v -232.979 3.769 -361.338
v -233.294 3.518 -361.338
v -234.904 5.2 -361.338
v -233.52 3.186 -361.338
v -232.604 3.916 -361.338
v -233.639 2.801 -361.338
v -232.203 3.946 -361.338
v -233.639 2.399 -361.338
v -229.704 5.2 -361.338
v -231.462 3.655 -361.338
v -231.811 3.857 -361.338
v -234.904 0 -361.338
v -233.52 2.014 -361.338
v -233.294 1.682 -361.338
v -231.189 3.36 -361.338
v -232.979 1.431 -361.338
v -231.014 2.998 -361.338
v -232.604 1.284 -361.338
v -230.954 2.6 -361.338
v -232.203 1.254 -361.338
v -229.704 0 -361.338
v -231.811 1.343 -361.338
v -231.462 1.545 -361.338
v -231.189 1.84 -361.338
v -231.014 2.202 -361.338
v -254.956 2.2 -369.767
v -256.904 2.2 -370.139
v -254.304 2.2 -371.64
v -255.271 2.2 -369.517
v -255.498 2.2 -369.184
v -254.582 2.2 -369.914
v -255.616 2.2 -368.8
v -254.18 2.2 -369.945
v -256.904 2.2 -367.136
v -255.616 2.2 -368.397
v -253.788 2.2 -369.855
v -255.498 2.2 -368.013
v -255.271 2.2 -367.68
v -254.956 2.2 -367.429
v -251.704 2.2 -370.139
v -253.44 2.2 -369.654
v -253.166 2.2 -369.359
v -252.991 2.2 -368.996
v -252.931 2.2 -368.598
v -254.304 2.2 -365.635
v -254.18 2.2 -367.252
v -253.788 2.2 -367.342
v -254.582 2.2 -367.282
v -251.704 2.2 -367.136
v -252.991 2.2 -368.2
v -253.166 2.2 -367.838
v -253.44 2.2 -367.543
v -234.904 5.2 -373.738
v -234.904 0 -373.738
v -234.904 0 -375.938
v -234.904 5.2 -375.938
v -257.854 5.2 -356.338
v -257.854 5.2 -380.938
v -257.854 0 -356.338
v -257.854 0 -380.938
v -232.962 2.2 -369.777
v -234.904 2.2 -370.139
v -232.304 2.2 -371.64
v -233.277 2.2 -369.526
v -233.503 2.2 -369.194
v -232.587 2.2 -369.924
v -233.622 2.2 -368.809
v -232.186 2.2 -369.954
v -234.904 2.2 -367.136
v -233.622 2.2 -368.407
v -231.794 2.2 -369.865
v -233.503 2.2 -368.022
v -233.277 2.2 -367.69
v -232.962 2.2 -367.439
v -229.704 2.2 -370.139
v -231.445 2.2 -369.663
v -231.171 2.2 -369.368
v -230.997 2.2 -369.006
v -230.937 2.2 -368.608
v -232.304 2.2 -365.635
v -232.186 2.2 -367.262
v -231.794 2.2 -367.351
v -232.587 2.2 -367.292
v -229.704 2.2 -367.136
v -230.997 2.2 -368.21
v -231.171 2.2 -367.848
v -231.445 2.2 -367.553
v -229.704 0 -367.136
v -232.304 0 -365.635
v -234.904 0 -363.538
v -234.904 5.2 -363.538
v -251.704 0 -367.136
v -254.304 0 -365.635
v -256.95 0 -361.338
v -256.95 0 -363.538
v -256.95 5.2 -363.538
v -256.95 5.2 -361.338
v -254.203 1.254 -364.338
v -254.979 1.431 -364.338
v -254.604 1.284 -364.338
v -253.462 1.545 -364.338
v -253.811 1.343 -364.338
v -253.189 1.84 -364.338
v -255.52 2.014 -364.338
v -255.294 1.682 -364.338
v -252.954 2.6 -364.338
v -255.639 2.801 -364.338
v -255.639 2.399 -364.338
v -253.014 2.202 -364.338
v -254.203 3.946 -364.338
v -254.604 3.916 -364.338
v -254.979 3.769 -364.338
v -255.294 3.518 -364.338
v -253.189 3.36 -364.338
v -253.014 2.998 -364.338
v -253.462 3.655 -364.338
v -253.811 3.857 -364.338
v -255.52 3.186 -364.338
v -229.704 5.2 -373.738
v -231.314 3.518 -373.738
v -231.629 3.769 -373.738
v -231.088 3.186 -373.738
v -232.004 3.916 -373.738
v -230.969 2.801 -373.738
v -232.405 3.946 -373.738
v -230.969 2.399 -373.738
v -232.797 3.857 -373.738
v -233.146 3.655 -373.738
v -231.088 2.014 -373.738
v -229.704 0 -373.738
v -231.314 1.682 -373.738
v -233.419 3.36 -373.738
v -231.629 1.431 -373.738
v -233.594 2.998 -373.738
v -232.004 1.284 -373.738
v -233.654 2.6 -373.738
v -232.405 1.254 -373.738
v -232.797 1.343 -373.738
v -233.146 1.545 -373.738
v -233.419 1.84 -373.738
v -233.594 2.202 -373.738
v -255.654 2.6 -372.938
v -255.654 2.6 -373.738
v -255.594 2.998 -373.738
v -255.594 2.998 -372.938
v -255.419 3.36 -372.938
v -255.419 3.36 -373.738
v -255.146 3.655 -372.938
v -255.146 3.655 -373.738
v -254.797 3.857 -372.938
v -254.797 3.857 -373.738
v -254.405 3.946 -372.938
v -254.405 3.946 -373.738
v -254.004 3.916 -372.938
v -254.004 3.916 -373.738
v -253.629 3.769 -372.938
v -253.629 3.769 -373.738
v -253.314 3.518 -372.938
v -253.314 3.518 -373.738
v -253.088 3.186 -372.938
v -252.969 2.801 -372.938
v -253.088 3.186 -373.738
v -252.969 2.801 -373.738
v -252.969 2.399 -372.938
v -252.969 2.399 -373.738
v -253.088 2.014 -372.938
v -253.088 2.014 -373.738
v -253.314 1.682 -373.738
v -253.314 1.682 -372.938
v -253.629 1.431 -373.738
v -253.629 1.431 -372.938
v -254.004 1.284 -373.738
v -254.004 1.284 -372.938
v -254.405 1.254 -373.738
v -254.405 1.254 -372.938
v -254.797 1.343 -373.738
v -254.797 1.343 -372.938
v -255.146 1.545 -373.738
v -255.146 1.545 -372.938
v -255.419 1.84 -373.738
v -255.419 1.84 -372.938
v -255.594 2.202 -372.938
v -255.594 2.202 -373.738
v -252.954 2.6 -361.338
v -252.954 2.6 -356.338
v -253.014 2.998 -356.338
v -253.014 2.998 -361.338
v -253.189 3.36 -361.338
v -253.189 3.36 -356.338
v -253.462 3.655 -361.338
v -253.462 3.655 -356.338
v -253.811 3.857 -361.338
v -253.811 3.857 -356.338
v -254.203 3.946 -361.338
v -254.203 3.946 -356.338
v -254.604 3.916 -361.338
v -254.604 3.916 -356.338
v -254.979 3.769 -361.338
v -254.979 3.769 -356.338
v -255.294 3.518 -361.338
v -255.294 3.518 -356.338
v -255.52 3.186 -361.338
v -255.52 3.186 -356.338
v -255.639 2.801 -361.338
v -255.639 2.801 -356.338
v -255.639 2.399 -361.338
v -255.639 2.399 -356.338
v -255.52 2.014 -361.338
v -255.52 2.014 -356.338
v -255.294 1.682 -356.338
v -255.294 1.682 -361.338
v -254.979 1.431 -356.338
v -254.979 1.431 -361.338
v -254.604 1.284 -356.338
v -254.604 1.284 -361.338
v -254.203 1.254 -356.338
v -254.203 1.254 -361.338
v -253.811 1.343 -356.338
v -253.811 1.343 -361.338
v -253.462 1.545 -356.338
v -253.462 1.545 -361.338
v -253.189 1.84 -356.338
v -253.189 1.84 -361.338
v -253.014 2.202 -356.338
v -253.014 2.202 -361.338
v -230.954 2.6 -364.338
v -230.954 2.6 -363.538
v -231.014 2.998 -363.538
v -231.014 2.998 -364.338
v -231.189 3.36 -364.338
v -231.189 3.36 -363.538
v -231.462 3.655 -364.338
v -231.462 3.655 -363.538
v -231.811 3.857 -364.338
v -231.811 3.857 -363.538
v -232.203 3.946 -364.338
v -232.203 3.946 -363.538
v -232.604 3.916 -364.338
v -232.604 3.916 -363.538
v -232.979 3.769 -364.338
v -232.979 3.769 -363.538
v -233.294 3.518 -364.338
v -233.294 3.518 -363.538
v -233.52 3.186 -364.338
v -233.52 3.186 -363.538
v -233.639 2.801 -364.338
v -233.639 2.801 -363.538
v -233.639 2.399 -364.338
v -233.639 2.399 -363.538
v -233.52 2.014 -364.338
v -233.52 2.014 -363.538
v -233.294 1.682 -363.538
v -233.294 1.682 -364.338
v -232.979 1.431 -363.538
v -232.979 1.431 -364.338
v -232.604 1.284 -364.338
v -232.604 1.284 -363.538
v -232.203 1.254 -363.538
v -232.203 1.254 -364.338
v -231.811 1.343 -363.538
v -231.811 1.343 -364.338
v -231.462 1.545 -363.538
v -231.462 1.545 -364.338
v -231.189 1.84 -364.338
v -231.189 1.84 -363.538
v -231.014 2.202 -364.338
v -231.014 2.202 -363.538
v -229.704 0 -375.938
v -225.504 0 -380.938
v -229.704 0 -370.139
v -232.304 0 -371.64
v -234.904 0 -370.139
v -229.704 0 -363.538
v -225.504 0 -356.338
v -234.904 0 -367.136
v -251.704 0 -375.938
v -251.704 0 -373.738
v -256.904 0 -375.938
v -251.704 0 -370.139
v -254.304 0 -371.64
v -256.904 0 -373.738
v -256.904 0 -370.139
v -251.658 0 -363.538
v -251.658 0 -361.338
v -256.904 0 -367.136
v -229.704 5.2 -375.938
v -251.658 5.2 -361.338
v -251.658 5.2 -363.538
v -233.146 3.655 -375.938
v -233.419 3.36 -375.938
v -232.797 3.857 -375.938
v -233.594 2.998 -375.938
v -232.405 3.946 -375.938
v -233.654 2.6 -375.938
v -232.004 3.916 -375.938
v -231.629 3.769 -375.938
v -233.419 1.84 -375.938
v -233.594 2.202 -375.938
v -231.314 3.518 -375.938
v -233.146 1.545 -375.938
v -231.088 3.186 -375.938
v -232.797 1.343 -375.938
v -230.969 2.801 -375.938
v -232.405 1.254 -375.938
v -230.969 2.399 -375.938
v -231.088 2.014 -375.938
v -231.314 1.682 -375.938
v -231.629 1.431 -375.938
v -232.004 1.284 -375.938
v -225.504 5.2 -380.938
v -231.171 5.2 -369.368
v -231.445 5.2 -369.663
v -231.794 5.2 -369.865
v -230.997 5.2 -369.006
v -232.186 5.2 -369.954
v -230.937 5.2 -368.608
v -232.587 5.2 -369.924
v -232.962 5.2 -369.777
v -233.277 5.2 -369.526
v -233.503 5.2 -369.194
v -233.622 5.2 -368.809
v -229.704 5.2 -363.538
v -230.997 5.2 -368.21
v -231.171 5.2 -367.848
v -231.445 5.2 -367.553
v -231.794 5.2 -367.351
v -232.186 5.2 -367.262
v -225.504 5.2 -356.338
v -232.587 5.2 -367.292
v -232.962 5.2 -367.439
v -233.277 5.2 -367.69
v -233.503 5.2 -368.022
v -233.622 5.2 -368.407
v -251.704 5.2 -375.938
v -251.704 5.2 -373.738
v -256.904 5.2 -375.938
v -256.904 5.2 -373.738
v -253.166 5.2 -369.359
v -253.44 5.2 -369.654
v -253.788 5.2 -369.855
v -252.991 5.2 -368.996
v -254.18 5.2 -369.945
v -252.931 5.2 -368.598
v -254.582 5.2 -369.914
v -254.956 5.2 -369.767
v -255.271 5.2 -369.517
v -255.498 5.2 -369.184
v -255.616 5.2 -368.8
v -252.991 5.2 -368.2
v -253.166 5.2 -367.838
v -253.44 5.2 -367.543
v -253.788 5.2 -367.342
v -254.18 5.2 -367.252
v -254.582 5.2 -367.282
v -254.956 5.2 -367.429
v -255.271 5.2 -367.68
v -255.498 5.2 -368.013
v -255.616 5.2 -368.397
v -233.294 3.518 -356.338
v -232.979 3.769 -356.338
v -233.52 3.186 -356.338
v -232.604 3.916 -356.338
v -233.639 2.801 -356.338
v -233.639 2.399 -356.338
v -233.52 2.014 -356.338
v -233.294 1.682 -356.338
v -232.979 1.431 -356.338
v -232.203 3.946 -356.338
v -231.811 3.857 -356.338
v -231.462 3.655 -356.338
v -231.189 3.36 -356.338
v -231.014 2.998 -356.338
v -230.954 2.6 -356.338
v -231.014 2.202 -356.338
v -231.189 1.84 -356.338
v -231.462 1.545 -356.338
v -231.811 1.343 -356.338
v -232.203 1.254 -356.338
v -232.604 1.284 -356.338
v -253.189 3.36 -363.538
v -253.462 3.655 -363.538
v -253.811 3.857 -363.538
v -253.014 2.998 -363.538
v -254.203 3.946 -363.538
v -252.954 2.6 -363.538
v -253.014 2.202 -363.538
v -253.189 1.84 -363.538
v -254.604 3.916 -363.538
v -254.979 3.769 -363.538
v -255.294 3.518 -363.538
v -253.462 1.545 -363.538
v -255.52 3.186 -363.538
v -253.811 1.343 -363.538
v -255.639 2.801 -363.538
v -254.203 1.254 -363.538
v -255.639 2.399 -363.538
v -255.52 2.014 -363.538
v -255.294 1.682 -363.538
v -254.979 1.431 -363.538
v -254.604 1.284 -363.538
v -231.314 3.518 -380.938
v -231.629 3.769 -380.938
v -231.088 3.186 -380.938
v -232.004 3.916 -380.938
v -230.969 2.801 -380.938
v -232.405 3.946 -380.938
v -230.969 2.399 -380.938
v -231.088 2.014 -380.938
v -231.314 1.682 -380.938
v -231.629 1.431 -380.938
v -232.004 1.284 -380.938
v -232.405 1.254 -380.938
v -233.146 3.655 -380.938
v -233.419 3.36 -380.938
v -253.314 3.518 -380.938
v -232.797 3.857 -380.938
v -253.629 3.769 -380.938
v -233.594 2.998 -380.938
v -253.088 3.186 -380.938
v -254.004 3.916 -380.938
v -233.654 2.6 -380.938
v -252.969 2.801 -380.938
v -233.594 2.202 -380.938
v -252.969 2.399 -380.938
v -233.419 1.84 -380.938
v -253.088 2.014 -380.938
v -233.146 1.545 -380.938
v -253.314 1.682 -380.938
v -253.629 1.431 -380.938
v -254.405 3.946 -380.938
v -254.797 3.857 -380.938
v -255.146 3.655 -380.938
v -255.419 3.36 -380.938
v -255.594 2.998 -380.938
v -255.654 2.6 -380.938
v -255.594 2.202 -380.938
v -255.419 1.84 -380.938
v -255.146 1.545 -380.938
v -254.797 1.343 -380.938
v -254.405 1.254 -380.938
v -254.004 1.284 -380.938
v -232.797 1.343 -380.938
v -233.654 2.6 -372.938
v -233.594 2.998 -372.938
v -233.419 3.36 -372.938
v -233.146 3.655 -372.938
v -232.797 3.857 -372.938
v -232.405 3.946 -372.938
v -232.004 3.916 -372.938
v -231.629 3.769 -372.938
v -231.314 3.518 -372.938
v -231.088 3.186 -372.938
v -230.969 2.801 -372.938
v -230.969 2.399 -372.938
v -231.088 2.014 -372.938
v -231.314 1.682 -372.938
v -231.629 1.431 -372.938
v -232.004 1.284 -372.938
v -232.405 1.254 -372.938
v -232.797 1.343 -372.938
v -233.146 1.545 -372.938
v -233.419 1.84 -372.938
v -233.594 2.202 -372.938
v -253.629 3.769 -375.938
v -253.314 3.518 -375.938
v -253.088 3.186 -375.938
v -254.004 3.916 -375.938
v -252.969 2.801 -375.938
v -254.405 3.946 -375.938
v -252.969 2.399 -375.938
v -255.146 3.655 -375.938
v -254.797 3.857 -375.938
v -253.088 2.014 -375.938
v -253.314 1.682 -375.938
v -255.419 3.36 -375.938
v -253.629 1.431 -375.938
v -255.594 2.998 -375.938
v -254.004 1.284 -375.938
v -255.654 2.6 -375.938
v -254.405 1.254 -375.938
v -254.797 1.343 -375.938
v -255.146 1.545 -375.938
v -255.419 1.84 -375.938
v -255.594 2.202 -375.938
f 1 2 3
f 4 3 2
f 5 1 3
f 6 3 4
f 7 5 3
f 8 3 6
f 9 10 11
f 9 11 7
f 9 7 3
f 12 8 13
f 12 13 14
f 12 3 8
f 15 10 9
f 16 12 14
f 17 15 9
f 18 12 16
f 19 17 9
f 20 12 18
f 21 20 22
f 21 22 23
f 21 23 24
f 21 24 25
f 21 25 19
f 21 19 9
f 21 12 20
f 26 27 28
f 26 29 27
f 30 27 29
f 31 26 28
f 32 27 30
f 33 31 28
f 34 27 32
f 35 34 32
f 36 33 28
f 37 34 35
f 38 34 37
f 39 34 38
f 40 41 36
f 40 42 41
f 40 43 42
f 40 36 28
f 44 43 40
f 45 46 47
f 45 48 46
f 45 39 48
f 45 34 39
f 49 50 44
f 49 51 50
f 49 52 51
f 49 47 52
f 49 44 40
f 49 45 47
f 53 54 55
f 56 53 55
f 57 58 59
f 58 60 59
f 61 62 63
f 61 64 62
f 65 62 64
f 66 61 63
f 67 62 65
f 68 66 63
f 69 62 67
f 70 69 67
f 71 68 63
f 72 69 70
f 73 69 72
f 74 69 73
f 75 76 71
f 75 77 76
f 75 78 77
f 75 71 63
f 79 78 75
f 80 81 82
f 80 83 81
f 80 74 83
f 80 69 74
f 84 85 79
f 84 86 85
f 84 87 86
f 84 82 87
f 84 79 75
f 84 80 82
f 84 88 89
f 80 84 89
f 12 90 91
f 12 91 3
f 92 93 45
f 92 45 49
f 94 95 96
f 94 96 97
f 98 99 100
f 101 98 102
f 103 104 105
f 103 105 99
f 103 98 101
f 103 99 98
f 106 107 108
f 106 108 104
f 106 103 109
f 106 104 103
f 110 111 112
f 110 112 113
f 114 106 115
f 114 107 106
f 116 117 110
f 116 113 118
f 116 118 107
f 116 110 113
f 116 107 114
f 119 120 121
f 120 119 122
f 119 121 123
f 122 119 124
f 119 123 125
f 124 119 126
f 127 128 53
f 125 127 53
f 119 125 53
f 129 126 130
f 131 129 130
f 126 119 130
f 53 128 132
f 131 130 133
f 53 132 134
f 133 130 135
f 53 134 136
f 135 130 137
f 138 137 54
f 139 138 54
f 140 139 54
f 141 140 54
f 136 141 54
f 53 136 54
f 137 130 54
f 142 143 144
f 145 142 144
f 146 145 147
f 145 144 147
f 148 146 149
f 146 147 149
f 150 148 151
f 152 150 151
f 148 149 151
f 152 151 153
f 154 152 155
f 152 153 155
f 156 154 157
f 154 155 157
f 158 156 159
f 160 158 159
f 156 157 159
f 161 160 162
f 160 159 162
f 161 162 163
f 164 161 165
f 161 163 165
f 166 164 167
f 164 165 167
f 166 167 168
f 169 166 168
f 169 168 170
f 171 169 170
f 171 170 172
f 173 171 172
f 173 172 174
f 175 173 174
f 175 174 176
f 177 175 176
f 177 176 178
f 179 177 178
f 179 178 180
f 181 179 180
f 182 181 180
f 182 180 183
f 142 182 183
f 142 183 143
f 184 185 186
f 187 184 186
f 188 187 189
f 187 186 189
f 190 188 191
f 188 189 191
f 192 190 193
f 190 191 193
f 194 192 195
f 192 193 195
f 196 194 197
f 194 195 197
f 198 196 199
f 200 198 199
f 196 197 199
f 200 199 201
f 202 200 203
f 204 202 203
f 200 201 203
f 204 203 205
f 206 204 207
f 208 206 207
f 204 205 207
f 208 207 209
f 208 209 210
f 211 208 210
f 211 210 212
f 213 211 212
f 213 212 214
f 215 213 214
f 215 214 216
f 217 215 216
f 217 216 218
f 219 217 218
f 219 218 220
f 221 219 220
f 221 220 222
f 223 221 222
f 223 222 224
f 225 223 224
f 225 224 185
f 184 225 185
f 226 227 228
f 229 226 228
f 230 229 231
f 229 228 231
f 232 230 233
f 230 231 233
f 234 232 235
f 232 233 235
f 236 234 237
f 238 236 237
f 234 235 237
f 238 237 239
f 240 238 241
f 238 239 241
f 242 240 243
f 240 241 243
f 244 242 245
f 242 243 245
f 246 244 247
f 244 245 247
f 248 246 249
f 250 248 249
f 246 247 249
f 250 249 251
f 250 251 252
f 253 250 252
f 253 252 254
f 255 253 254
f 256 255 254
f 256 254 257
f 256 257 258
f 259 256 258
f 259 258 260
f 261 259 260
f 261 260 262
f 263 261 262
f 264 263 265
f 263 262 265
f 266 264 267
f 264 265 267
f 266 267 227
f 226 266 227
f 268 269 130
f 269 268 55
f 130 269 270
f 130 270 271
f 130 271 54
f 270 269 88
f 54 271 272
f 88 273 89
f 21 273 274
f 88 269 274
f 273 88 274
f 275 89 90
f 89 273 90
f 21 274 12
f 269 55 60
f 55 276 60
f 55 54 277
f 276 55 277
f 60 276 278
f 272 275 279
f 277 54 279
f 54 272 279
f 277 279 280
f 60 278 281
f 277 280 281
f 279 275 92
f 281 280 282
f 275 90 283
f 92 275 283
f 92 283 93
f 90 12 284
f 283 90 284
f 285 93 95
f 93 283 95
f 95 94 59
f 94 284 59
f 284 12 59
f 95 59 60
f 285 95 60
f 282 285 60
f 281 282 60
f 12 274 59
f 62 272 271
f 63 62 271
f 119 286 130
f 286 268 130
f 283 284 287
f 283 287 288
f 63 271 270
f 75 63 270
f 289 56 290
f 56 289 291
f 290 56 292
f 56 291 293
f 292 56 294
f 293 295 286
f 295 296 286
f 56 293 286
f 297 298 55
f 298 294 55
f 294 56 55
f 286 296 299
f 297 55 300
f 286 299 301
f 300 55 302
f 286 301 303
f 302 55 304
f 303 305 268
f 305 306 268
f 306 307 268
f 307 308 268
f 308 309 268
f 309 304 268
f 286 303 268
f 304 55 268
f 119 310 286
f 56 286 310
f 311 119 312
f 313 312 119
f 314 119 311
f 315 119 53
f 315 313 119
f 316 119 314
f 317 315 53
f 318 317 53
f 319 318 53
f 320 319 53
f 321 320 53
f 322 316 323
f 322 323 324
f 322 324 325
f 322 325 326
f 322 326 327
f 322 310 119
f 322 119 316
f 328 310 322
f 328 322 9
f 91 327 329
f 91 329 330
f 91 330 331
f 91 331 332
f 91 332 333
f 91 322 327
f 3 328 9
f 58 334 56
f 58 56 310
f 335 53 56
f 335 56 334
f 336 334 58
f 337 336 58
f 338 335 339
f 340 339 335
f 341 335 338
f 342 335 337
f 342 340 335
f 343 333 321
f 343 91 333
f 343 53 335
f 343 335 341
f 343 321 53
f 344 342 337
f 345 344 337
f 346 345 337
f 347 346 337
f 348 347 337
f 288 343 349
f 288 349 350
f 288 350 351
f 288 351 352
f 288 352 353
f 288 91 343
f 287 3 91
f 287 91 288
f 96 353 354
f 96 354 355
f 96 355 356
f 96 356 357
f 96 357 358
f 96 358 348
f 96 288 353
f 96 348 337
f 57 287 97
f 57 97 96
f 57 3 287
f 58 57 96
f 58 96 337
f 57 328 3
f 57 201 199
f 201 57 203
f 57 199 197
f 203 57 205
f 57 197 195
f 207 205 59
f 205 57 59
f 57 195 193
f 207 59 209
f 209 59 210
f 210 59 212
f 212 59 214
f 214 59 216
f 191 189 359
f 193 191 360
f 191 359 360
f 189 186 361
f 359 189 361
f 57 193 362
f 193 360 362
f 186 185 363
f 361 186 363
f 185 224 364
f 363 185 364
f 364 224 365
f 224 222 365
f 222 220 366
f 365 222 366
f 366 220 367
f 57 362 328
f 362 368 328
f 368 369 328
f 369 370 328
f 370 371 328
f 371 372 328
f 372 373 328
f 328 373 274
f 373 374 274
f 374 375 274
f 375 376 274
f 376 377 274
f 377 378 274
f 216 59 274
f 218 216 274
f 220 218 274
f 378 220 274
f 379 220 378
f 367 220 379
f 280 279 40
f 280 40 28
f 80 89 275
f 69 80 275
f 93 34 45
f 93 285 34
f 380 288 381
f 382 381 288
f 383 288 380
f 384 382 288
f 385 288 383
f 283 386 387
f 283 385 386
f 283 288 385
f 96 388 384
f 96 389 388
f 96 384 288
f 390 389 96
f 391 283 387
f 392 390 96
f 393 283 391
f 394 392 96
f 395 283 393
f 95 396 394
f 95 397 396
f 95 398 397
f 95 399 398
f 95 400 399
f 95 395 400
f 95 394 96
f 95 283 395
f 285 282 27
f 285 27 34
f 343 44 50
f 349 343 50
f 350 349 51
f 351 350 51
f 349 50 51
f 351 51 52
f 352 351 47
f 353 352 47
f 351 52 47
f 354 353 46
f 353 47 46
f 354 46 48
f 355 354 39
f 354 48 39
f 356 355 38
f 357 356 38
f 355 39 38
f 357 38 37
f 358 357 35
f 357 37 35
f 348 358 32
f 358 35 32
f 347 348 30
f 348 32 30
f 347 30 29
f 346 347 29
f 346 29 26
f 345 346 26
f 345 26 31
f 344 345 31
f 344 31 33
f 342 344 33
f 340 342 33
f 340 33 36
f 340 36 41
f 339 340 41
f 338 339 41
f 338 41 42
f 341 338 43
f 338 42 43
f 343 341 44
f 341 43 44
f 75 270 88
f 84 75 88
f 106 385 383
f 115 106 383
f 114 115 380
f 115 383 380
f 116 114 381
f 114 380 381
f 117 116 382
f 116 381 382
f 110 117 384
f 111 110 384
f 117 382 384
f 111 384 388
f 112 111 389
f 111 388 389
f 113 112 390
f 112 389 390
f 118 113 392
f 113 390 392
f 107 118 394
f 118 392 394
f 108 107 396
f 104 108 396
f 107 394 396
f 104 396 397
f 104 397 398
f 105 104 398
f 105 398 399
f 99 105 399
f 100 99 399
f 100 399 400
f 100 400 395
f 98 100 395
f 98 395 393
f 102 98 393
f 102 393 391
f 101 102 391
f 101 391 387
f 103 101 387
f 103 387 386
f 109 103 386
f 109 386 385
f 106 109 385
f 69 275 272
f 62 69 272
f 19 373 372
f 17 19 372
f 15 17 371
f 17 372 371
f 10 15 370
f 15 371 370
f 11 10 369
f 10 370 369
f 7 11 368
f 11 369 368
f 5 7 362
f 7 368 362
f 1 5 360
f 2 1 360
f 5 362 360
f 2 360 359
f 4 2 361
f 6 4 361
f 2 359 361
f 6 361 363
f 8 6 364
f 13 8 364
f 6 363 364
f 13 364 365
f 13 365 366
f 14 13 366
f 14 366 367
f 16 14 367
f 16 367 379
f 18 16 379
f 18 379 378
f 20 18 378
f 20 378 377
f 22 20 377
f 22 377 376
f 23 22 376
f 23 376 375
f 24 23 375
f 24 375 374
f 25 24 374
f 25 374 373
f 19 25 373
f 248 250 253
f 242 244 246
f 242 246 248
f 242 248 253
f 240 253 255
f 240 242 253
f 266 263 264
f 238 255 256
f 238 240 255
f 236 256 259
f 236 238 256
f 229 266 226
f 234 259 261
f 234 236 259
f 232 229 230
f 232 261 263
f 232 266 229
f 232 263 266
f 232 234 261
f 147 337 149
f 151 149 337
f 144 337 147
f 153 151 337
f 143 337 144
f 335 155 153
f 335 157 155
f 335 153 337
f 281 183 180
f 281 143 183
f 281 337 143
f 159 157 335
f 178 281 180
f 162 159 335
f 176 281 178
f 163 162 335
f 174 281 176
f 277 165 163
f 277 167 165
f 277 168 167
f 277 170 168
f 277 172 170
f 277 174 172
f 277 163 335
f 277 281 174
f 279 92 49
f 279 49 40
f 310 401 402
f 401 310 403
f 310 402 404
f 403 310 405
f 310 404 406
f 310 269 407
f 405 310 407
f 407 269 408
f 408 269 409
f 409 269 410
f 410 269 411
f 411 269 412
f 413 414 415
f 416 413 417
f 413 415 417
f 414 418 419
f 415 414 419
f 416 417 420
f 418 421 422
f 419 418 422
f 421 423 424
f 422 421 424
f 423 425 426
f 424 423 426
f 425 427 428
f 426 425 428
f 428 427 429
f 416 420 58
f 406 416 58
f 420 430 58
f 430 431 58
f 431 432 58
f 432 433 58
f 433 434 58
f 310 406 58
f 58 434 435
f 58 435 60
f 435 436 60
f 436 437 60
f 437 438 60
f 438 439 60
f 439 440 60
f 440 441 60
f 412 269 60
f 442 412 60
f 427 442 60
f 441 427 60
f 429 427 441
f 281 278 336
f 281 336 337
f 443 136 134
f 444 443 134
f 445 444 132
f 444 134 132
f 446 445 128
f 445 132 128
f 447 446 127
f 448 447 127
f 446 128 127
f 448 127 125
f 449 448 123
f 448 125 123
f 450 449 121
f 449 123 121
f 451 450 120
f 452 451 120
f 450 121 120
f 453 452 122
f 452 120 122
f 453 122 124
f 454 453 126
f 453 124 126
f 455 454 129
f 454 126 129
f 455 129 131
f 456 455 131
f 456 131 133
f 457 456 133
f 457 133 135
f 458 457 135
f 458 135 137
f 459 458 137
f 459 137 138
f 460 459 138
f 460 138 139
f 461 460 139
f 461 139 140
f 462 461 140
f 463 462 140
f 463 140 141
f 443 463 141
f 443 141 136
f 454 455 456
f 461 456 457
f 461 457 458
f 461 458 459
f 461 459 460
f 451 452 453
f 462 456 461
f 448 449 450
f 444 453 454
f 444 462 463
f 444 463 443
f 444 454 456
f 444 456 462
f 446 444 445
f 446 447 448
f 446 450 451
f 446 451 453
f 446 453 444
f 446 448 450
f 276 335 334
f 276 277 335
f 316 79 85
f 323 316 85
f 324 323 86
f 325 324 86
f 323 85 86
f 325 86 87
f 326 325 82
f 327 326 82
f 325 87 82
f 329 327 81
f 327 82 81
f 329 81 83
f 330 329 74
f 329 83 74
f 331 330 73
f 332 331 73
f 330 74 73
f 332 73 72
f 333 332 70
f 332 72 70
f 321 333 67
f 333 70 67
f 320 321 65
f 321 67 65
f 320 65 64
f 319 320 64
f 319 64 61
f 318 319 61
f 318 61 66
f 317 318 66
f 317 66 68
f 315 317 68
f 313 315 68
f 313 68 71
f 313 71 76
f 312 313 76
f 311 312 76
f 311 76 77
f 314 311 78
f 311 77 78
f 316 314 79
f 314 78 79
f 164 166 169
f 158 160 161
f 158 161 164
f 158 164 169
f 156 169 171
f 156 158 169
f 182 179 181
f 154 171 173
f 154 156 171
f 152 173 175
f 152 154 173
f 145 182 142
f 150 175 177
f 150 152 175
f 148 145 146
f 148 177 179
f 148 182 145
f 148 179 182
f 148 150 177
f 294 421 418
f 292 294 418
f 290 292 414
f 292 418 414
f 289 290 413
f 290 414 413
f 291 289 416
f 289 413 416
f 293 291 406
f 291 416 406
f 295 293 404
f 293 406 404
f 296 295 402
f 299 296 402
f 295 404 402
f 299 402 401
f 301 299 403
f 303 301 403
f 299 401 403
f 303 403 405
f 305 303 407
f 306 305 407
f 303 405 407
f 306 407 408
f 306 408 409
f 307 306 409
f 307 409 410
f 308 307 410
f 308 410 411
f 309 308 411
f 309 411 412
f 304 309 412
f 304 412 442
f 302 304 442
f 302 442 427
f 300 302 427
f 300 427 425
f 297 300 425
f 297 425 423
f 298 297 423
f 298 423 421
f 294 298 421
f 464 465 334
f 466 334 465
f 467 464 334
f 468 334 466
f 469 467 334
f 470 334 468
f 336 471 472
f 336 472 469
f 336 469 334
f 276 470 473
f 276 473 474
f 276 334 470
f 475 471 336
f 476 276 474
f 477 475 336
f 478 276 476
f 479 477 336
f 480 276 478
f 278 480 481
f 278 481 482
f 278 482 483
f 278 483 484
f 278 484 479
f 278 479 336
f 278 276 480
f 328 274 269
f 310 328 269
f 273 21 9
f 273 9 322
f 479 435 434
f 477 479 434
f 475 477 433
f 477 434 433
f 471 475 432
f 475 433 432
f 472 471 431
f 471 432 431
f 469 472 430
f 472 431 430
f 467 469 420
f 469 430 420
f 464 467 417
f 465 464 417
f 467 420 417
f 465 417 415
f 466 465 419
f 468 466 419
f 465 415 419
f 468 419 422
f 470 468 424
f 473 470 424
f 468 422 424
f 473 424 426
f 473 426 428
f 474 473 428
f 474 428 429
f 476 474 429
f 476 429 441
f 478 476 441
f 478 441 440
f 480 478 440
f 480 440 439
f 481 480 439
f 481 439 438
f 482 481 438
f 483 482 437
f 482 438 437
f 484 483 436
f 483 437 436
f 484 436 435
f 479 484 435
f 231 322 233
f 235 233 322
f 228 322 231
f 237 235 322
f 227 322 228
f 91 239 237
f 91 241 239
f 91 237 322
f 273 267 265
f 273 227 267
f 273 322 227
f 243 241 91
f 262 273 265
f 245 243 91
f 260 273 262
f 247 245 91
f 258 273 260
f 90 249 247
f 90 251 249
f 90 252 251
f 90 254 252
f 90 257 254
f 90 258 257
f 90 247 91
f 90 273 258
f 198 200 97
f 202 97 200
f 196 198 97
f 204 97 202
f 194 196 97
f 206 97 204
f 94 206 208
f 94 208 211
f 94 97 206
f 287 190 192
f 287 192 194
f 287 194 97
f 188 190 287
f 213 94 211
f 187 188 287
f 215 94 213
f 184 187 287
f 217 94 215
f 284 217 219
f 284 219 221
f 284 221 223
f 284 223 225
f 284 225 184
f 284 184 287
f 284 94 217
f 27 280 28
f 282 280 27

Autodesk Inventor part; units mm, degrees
ref_plane "YZ Plane" through (0, 0, 0) normal (1, 0, 0) x (0, 1, 0)
ref_plane "XZ Plane" through (0, 0, 0) normal (0, 1, 0) x (-1, 0, 0)
ref_plane "XY Plane" through (0, 0, 0) normal (0, 0, 1) x (1, 0, 0)
sketch "스케치1" plane through (0, 0, 0) normal (0, 1, 0) x (-1, 0, 0)
  line L0 (206.554, -381.1375) -> (206.9537, -381.1375)
  line L1 (206.9537, -381.1375) -> (207.1542, -381.1375)
  line L2 (207.1542, -381.1375) -> (210.304, -381.1375)
  line L3 (210.304, -381.1375) -> (210.304, -370.6375)
  line L4 (210.304, -370.6375) -> (211.404, -370.6375)
  line L5 (211.404, -370.6375) -> (211.404, -356.1375)
  line L6 (211.404, -356.1375) -> (224.204, -356.1375)
  line L7 (224.204, -370.6375) -> (224.204, -356.1375)
  line L8 (224.204, -370.6375) -> (225.304, -370.6375)
  line L9 (225.304, -381.1375) -> (225.304, -370.6375)
  line L10 (225.304, -381.1375) -> (228.9537, -381.1375)
  line L11 (228.9537, -381.1375) -> (229.1542, -381.1375)
  line L12 (229.1542, -381.1375) -> (233.029, -381.1375)
  line L13 (233.029, -383.6375) -> (233.029, -381.1375)
  line L14 (233.029, -383.6375) -> (247.079, -383.6375)
  line L15 (247.079, -383.6375) -> (247.079, -381.1375)
  line L16 (247.079, -381.1375) -> (250.9537, -381.1375)
  line L17 (250.9537, -381.1375) -> (251.1542, -381.1375)
  line L18 (251.1542, -381.1375) -> (255.029, -381.1375)
  line L19 (255.029, -383.6375) -> (255.029, -381.1375)
  line L20 (255.029, -383.6375) -> (258.054, -383.6375)
  line L21 (258.054, -353.6375) -> (258.054, -383.6375)
  line L22 (255.029, -353.6375) -> (258.054, -353.6375)
  line L23 (255.029, -353.6375) -> (255.029, -356.1375)
  line L24 (251.1542, -356.1375) -> (255.029, -356.1375)
  line L25 (250.9537, -356.1375) -> (251.1542, -356.1375)
  line L26 (247.079, -356.1375) -> (250.9537, -356.1375)
  line L27 (247.079, -353.6375) -> (247.079, -356.1375)
  line L28 (233.029, -353.6375) -> (247.079, -353.6375)
  line L29 (233.029, -353.6375) -> (233.029, -356.1375)
  line L30 (229.1542, -356.1375) -> (233.029, -356.1375)
  line L31 (228.9537, -356.1375) -> (229.1542, -356.1375)
  line L32 (225.079, -356.1375) -> (228.9537, -356.1375)
  line L33 (225.079, -353.6375) -> (225.079, -356.1375)
  line L34 (211.029, -353.6375) -> (225.079, -353.6375)
  line L35 (211.029, -353.6375) -> (211.029, -356.1375)
  line L36 (207.1542, -356.1375) -> (211.029, -356.1375)
  line L37 (206.9537, -356.1375) -> (207.1542, -356.1375)
  line L38 (206.554, -356.1375) -> (206.9537, -356.1375)
  line L39 (206.554, -356.1375) -> (206.554, -381.1375)
  circle A0 centre (240.054, -368.6375) radius 5.2901
  line L40 (258.054, -356.1375) -> (225.304, -356.1375)
  line L41 (225.304, -356.1375) -> (225.304, -381.1375)
  line L42 (225.304, -381.1375) -> (258.054, -381.1375)
  line L43 (258.054, -381.1375) -> (258.054, -356.1375)
  line L44 (257.854, -356.3375) -> (225.504, -356.3375)
  line L45 (225.504, -356.3375) -> (225.504, -380.9375)
  line L46 (225.504, -380.9375) -> (257.854, -380.9375)
  line L47 (257.854, -380.9375) -> (257.854, -356.3375)
  line L48 (255.029, -354.8875) -> (251.054, -354.8875)
  circle A1 centre (251.054, -354.8875) radius 0.8707
  line L49 (255.029, -382.3875) -> (247.079, -382.3875)
  line L50 (251.054, -354.8875) -> (251.054, -382.3875)
  line L51 (233.029, -354.8875) -> (229.054, -354.8875)
  line L52 (229.054, -354.8875) -> (229.054, -382.3875)
  dimension "d37" = 25
  dimension "d38" = 32.75
  dimension "d39" = 0.2
  dimension "d40" = 2.5
  dimension "d41" = 7.95
  dimension "d42" = 3.975
  dimension "d43" = 3.975
extrude "돌출2" add sketch "스케치1" along normal blind 5.2 contours L52 L46 L45 L44 | L44 L50 L46 L52 | L44 L47 L46 L50 | A0
sketch "스케치4" plane through (-225.504, 0, -380.9375) normal (0, 0, -1) x (-1, 0, 0)
  line L0 (0, 0) -> (32.35, 0) projected
  line L1 (32.35, 0) -> (32.35, 5.2) projected
  line L2 (0, 5.2) -> (32.35, 5.2) projected
  line L3 (0, 0) -> (0, 5.2) projected
  line L4 (32.35, 5.2) -> (28.8, 5.2)
  line L5 (32.35, 5.2) -> (0, 5.2) projected
  line L6 (0, 5.2) -> (6.8, 5.2)
  line L7 (32.35, 2.6) -> (0, 2.6)
  circle A0 centre (28.8, 2.6) radius 1.35
  circle A1 centre (6.8, 2.6) radius 1.35
  point P0 (-225.504, 0)
  dimension "d59" = 3.55
  dimension "d60" = 6.8
  dimension "d69" = 2.7
  dimension "d70" = 2.7
extrude "돌출3" cut sketch "스케치4" against normal blind 8 contours A1 L7 | L7 A1 | A0 L7 | L7 A0
sketch "스케치5" plane through (-257.854, 0, -356.3375) normal (0, 0, 1) x (1, 0, 0)
  circle A0 centre (3.55, 3) radius 1.35 projected
  circle A1 centre (25.55, 3) radius 1.35 projected
  circle A2 centre (3.55, 2.6) radius 1.35 projected
  circle A3 centre (25.55, 2.6) radius 1.35 projected
  point P0 (257.854, 0)
extrude "돌출4" cut sketch "스케치5" against normal blind 8 contours A2 A0 | A0 A2 | A3 A1 | A1 A3 picked at (3.4443, 2.4292) picked at (3.7277, 1.535) picked at (25.4443, 2.4292) picked at (25.7277, 1.535)
sketch "스케치6" plane through (0, 0, 0) normal (0, -1, 0) x (1, 0, 0)
  line L0 (-225.504, -356.3375) -> (-225.504, -380.9375) projected
  line L1 (-225.504, -356.3375) -> (-225.504, -380.9375) projected
  line L2 (-225.504, -356.3375) -> (-225.504, -380.9375) projected
  line L3 (-225.504, -356.3375) -> (-225.504, -380.9375) projected
  line L4 (-257.854, -356.3375) -> (-225.504, -356.3375) projected
  line L5 (-230.954, -380.9375) -> (-233.654, -380.9375) projected
  line L6 (-230.954, -372.9375) -> (-233.654, -372.9375) projected
  line L7 (-233.654, -356.3375) -> (-230.954, -356.3375) projected
  line L8 (-233.654, -364.3375) -> (-230.954, -364.3375) projected
  line L9 (-230.954, -372.9375) -> (-233.654, -372.9375) projected
  line L10 (-230.954, -372.9375) -> (-233.654, -372.9375) projected
  line L11 (-230.954, -380.9375) -> (-233.654, -380.9375) projected
  line L12 (-233.654, -364.3375) -> (-230.954, -364.3375) projected
  line L13 (-233.654, -364.3375) -> (-230.954, -364.3375) projected
  line L14 (-233.654, -356.3375) -> (-230.954, -356.3375) projected
  line L15 (-255.654, -356.3375) -> (-252.954, -356.3375) projected
  line L16 (-255.654, -364.3375) -> (-252.954, -364.3375) projected
  line L17 (-255.654, -356.3375) -> (-252.954, -356.3375) projected
  line L18 (-257.854, -356.3375) -> (-225.504, -356.3375) projected
  line L19 (-257.854, -380.9375) -> (-257.854, -356.3375) projected
  line L20 (-257.854, -380.9375) -> (-257.854, -356.3375) projected
  line L21 (-257.854, -356.3375) -> (-225.504, -356.3375) projected
  line L22 (-257.854, -380.9375) -> (-257.854, -356.3375) projected
  line L23 (-225.504, -380.9375) -> (-257.854, -380.9375) projected
  line L24 (-225.504, -356.3375) -> (-225.504, -380.9375) projected
  line L25 (-257.854, -356.3375) -> (-225.504, -356.3375) projected
  line L26 (-225.504, -356.3375) -> (-225.504, -380.9375) projected
  line L27 (-225.504, -380.9375) -> (-257.854, -380.9375) projected
  line L28 (-257.854, -380.9375) -> (-257.854, -356.3375) projected
  line L29 (-257.854, -356.3375) -> (-225.504, -356.3375) projected
  line L30 (-257.854, -356.3375) -> (-225.504, -356.3375) projected
  line L31 (-257.854, -380.9375) -> (-257.854, -356.3375) projected
  line L32 (-257.854, -380.9375) -> (-257.854, -356.3375) projected
  line L33 (-255.654, -364.3375) -> (-252.954, -364.3375) projected
  line L34 (-255.654, -364.3375) -> (-252.954, -364.3375) projected
  line L35 (-252.954, -372.9375) -> (-255.654, -372.9375) projected
  line L36 (-252.954, -372.9375) -> (-255.654, -372.9375) projected
  line L37 (-252.954, -372.9375) -> (-255.654, -372.9375) projected
  line L38 (-252.954, -380.9375) -> (-255.654, -380.9375) projected
  line L39 (-252.954, -380.9375) -> (-255.654, -380.9375) projected
  line L40 (-225.504, -380.9375) -> (-257.854, -380.9375) projected
  line L41 (-225.504, -380.9375) -> (-257.854, -380.9375) projected
  line L42 (-225.504, -380.9375) -> (-257.854, -380.9375) projected
  line L43 (-225.504, -380.9375) -> (-257.854, -380.9375) projected
  line L44 (-252.954, -356.3375) -> (-252.954, -364.3375) projected
  line L45 (-255.654, -356.3375) -> (-255.654, -364.3375) projected
  line L46 (-255.654, -380.9375) -> (-255.654, -372.9375) projected
  line L47 (-252.954, -380.9375) -> (-252.954, -372.9375) projected
  line L48 (-233.654, -380.9375) -> (-233.654, -372.9375) projected
  line L49 (-230.954, -380.9375) -> (-230.954, -372.9375) projected
  line L50 (-233.654, -356.3375) -> (-233.654, -364.3375) projected
  line L51 (-230.954, -356.3375) -> (-230.954, -364.3375) projected
  line L52 (-232.304, -365.7508) -> (-231.054, -366.4725)
  line L53 (-233.554, -366.4725) -> (-232.304, -365.7508)
  line L54 (-229.804, -367.1941) -> (-229.804, -368.6375)
  line L55 (-231.054, -366.4725) -> (-229.804, -367.1941)
  line L56 (-234.804, -368.6375) -> (-234.804, -367.1941)
  line L57 (-234.804, -367.1941) -> (-233.554, -366.4725)
  line L58 (-234.804, -368.6375) -> (-234.804, -367.1941)
  line L59 (-234.804, -370.0809) -> (-234.804, -368.6375)
  line L60 (-231.054, -370.8026) -> (-232.304, -371.5243)
  line L61 (-232.304, -371.5243) -> (-233.554, -370.8026)
  line L62 (-229.804, -368.6375) -> (-229.804, -370.0809)
  line L63 (-229.804, -370.0809) -> (-231.054, -370.8026)
  line L64 (-229.804, -367.1941) -> (-229.804, -368.6375)
  line L65 (-231.054, -366.4725) -> (-229.804, -367.1941)
  line L66 (-233.554, -370.8026) -> (-234.804, -370.0809)
  line L67 (-234.804, -370.0809) -> (-234.804, -368.6375)
  line L68 (-254.304, -365.7508) -> (-253.054, -366.4725)
  line L69 (-255.554, -366.4725) -> (-254.304, -365.7508)
  line L70 (-251.804, -367.1941) -> (-251.804, -368.6375)
  line L71 (-253.054, -366.4725) -> (-251.804, -367.1941)
  line L72 (-256.804, -368.6375) -> (-256.804, -367.1941)
  line L73 (-256.804, -367.1941) -> (-255.554, -366.4725)
  line L74 (-256.804, -368.6375) -> (-256.804, -367.1941)
  line L75 (-256.804, -370.0809) -> (-256.804, -368.6375)
  line L76 (-253.054, -370.8026) -> (-254.304, -371.5243)
  line L77 (-254.304, -371.5243) -> (-255.554, -370.8026)
  line L78 (-251.804, -368.6375) -> (-251.804, -370.0809)
  line L79 (-251.804, -370.0809) -> (-253.054, -370.8026)
  line L80 (-251.804, -367.1941) -> (-251.804, -368.6375)
  line L81 (-253.054, -366.4725) -> (-251.804, -367.1941)
  line L82 (-255.554, -370.8026) -> (-256.804, -370.0809)
  line L83 (-256.804, -370.0809) -> (-256.804, -368.6375)
  point P0 (0, 0)
  point P1 (-232.304, -368.6375)
  point P2 (-254.304, -368.6375)
  dimension "d75" = 5.7735
extrude "돌출5" cut sketch "스케치6" against normal blind 2 contours L52 L55 L54 L62 L63 L60 L61 L66 L59 L56 L57 L53 | L68 L71 L70 L78 L79 L76 L77 L82 L75 L72 L73 L69
sketch "스케치7" plane through (0, 2, 0) normal (0, -1, 0) x (1, 0, 0)
  line L0 (-256.804, -367.1941) -> (-254.304, -365.7508) projected
  line L1 (-256.804, -370.0809) -> (-256.804, -367.1941) projected
  line L2 (-254.304, -371.5243) -> (-256.804, -370.0809) projected
  line L3 (-251.804, -370.0809) -> (-254.304, -371.5243) projected
  line L4 (-251.804, -367.1941) -> (-251.804, -370.0809) projected
  line L5 (-254.304, -365.7508) -> (-251.804, -367.1941) projected
  line L6 (-234.804, -367.1941) -> (-232.304, -365.7508) projected
  line L7 (-234.804, -370.0809) -> (-234.804, -367.1941) projected
  line L8 (-232.304, -371.5243) -> (-234.804, -370.0809) projected
  line L9 (-229.804, -370.0809) -> (-232.304, -371.5243) projected
  line L10 (-229.804, -367.1941) -> (-229.804, -370.0809) projected
  line L11 (-232.304, -365.7508) -> (-229.804, -367.1941) projected
  circle A0 centre (-254.2813, -368.5983) radius 1.35
  circle A1 centre (-232.2869, -368.608) radius 1.35
  point P0 (0, 0)
  dimension "d71" = 2.7
  dimension "d72" = 2.7
extrude "돌출6" cut sketch "스케치7" against normal blind 8 contours A0 | A1
sketch "스케치9" plane through (0, 0, 0) normal (0, -1, 0) x (1, 0, 0)
  circle A0 centre (-232.2869, -368.608) radius 1.35 projected
  line L0 (-234.804, -367.1941) -> (-232.304, -365.7508) projected
  line L1 (-234.804, -370.0809) -> (-234.804, -367.1941) projected
  line L2 (-232.304, -371.5243) -> (-234.804, -370.0809) projected
  line L3 (-229.804, -370.0809) -> (-232.304, -371.5243) projected
  line L4 (-229.804, -367.1941) -> (-229.804, -370.0809) projected
  line L5 (-232.304, -365.7508) -> (-229.804, -367.1941) projected
  circle A1 centre (-254.2813, -368.5983) radius 1.35 projected
  line L6 (-256.804, -367.1941) -> (-254.304, -365.7508) projected
  line L7 (-256.804, -370.0809) -> (-256.804, -367.1941) projected
  line L8 (-254.304, -371.5243) -> (-256.804, -370.0809) projected
  line L9 (-251.804, -370.0809) -> (-254.304, -371.5243) projected
  line L10 (-251.804, -367.1941) -> (-251.804, -370.0809) projected
  line L11 (-254.304, -365.7508) -> (-251.804, -367.1941) projected
  line L12 (-251.704, -367.1364) -> (-251.704, -370.1386)
  line L13 (-251.704, -370.1386) -> (-254.304, -371.6397)
  line L14 (-254.304, -371.6397) -> (-256.904, -370.1386)
  line L15 (-256.904, -370.1386) -> (-256.904, -367.1364)
  line L16 (-256.904, -367.1364) -> (-254.304, -365.6353)
  line L17 (-254.304, -365.6353) -> (-251.704, -367.1364)
  line L18 (-232.304, -365.6353) -> (-234.904, -367.1364)
  line L19 (-234.904, -367.1364) -> (-234.904, -370.1386)
  line L20 (-234.904, -370.1386) -> (-232.304, -371.6397)
  line L21 (-232.304, -371.6397) -> (-229.704, -370.1386)
  line L22 (-229.704, -370.1386) -> (-229.704, -367.1364)
  line L23 (-229.704, -367.1364) -> (-232.304, -365.6353)
  point P0 (0, 0)
  dimension "d78" = 0.1
  dimension "d79" = 0.1
extrude "돌출7" cut sketch "스케치9" against normal blind 2.2 contours A0 | L0 L5 L4 L3 L2 L1 | A1 | L6 L11 L10 L9 L8 L7 | L12 L13 L14 L15 L16 L17 | L23 L22 L21 L20 L19 L18
sketch "스케치10" plane through (0, 0, 0) normal (0, -1, 0) x (1, 0, 0)
  line L0 (-252.954, -380.9375) -> (-255.654, -380.9375) projected
  line L1 (-257.854, -380.9375) -> (-257.854, -356.3375) projected
  line L2 (-257.854, -380.9375) -> (-257.854, -356.3375) projected
  line L3 (-255.654, -356.3375) -> (-252.954, -356.3375) projected
  line L4 (-252.954, -372.9375) -> (-255.654, -372.9375) projected
  line L5 (-255.654, -364.3375) -> (-252.954, -364.3375) projected
  circle A0 centre (-254.2813, -368.5983) radius 1.35 projected
  line L6 (-230.954, -380.9375) -> (-233.654, -380.9375) projected
  line L7 (-230.954, -372.9375) -> (-233.654, -372.9375) projected
  line L8 (-230.954, -372.9375) -> (-233.654, -372.9375) projected
  line L9 (-230.954, -372.9375) -> (-233.654, -372.9375) projected
  line L10 (-230.954, -380.9375) -> (-233.654, -380.9375) projected
  line L11 (-233.654, -364.3375) -> (-230.954, -364.3375) projected
  line L12 (-233.654, -364.3375) -> (-230.954, -364.3375) projected
  line L13 (-233.654, -356.3375) -> (-230.954, -356.3375) projected
  line L14 (-233.654, -364.3375) -> (-230.954, -364.3375) projected
  line L15 (-233.654, -356.3375) -> (-230.954, -356.3375) projected
  line L16 (-257.854, -356.3375) -> (-225.504, -356.3375) projected
  line L17 (-257.854, -356.3375) -> (-225.504, -356.3375) projected
  line L18 (-225.504, -356.3375) -> (-225.504, -380.9375) projected
  line L19 (-225.504, -356.3375) -> (-225.504, -380.9375) projected
  line L20 (-225.504, -380.9375) -> (-257.854, -380.9375) projected
  line L21 (-225.504, -380.9375) -> (-257.854, -380.9375) projected
  line L22 (-230.954, -380.9375) -> (-233.654, -380.9375) projected
  line L23 (-252.954, -380.9375) -> (-255.654, -380.9375) projected
  line L24 (-225.504, -380.9375) -> (-257.854, -380.9375) projected
  line L25 (-225.504, -380.9375) -> (-257.854, -380.9375) projected
  line L26 (-256.904, -370.1386) -> (-256.904, -367.1364) projected
  line L27 (-256.904, -367.1364) -> (-254.304, -365.6353) projected
  line L28 (-254.304, -365.6353) -> (-251.704, -367.1364) projected
  line L29 (-251.704, -367.1364) -> (-251.704, -370.1386) projected
  line L30 (-251.704, -370.1386) -> (-254.304, -371.6397) projected
  line L31 (-254.304, -371.6397) -> (-256.904, -370.1386) projected
  line L32 (-232.304, -371.6397) -> (-234.904, -370.1386) projected
  line L33 (-234.904, -370.1386) -> (-234.904, -367.1364) projected
  line L34 (-234.904, -367.1364) -> (-232.304, -365.6353) projected
  line L35 (-232.304, -365.6353) -> (-229.704, -367.1364) projected
  line L36 (-229.704, -367.1364) -> (-229.704, -370.1386) projected
  line L37 (-229.704, -370.1386) -> (-232.304, -371.6397) projected
  line L38 (-257.854, -356.3375) -> (-225.504, -356.3375) projected
  line L39 (-257.854, -380.9375) -> (-257.854, -356.3375) projected
  line L40 (-225.504, -380.9375) -> (-257.854, -380.9375) projected
  line L41 (-225.504, -356.3375) -> (-225.504, -380.9375) projected
  circle A1 centre (-232.2869, -368.608) radius 1.35 projected
  circle A2 centre (-254.2813, -368.5983) radius 1.35 projected
  line L42 (-257.854, -356.3375) -> (-225.504, -356.3375) projected
  line L43 (-225.504, -356.3375) -> (-225.504, -380.9375) projected
  line L44 (-225.504, -380.9375) -> (-257.854, -380.9375) projected
  line L45 (-257.854, -380.9375) -> (-257.854, -356.3375) projected
  line L46 (-233.654, -356.3375) -> (-230.954, -356.3375) projected
  line L47 (-255.654, -356.3375) -> (-252.954, -356.3375) projected
  line L48 (-257.854, -356.3375) -> (-225.504, -356.3375) projected
  line L49 (-257.854, -356.3375) -> (-225.504, -356.3375) projected
  line L50 (-234.904, -370.1386) -> (-234.904, -367.1364) projected
  line L51 (-234.904, -370.1386) -> (-234.904, -367.1364) projected
  line L52 (-232.304, -371.6397) -> (-234.904, -370.1386) projected
  line L53 (-232.304, -371.6397) -> (-234.904, -370.1386) projected
  line L54 (-232.304, -371.6397) -> (-234.904, -370.1386) projected
  line L55 (-232.304, -371.6397) -> (-234.904, -370.1386) projected
  line L56 (-234.904, -367.1364) -> (-232.304, -365.6353) projected
  line L57 (-234.904, -367.1364) -> (-232.304, -365.6353) projected
  line L58 (-234.904, -367.1364) -> (-232.304, -365.6353) projected
  line L59 (-234.904, -367.1364) -> (-232.304, -365.6353) projected
  circle A3 centre (-232.2869, -368.608) radius 1.35 projected
  circle A4 centre (-232.2869, -368.608) radius 1.35 projected
  circle A5 centre (-232.2869, -368.608) radius 1.35 projected
  circle A6 centre (-232.2869, -368.608) radius 1.35 projected
  line L60 (-234.904, -370.1386) -> (-234.904, -367.1364) projected
  line L61 (-232.304, -371.6397) -> (-234.904, -370.1386) projected
  line L62 (-229.704, -370.1386) -> (-232.304, -371.6397) projected
  line L63 (-229.704, -367.1364) -> (-229.704, -370.1386) projected
  line L64 (-232.304, -365.6353) -> (-229.704, -367.1364) projected
  line L65 (-234.904, -367.1364) -> (-232.304, -365.6353) projected
  line L66 (-229.704, -367.1364) -> (-229.704, -370.1386) projected
  line L67 (-229.704, -367.1364) -> (-229.704, -370.1386) projected
  line L68 (-229.704, -367.1364) -> (-229.704, -370.1386) projected
  line L69 (-232.304, -365.6353) -> (-229.704, -367.1364) projected
  line L70 (-232.304, -365.6353) -> (-229.704, -367.1364) projected
  line L71 (-225.504, -356.3375) -> (-225.504, -380.9375) projected
  line L72 (-225.504, -356.3375) -> (-225.504, -380.9375) projected
  circle A7 centre (-232.2869, -368.608) radius 1.35 projected
  line L73 (-232.304, -365.6353) -> (-229.704, -367.1364) projected
  line L74 (-229.704, -367.1364) -> (-229.704, -370.1386) projected
  line L75 (-229.704, -370.1386) -> (-232.304, -371.6397) projected
  line L76 (-232.304, -365.6353) -> (-229.704, -367.1364) projected
  line L77 (-229.704, -370.1386) -> (-232.304, -371.6397) projected
  line L78 (-229.704, -370.1386) -> (-232.304, -371.6397) projected
  line L79 (-229.704, -370.1386) -> (-232.304, -371.6397) projected
  line L80 (-234.904, -370.1386) -> (-234.904, -367.1364) projected
  line L81 (-251.704, -367.1364) -> (-251.704, -370.1386) projected
  line L82 (-251.704, -367.1364) -> (-251.704, -370.1386) projected
  line L83 (-254.304, -365.6353) -> (-251.704, -367.1364) projected
  line L84 (-254.304, -365.6353) -> (-251.704, -367.1364) projected
  line L85 (-251.704, -370.1386) -> (-254.304, -371.6397) projected
  line L86 (-251.704, -370.1386) -> (-254.304, -371.6397) projected
  circle A8 centre (-254.2813, -368.5983) radius 1.35 projected
  line L87 (-256.904, -367.1364) -> (-254.304, -365.6353) projected
  line L88 (-256.904, -367.1364) -> (-254.304, -365.6353) projected
  line L89 (-254.304, -371.6397) -> (-256.904, -370.1386) projected
  line L90 (-254.304, -371.6397) -> (-256.904, -370.1386) projected
  line L91 (-234.904, -370.1386) -> (-234.904, -367.1364) projected
  line L92 (-251.704, -370.1386) -> (-254.304, -371.6397) projected
  line L93 (-251.704, -370.1386) -> (-254.304, -371.6397) projected
  line L94 (-252.954, -372.9375) -> (-255.654, -372.9375) projected
  line L95 (-252.954, -372.9375) -> (-255.654, -372.9375) projected
  line L96 (-252.954, -380.9375) -> (-255.654, -380.9375) projected
  line L97 (-254.304, -365.6353) -> (-251.704, -367.1364) projected
  line L98 (-254.304, -365.6353) -> (-251.704, -367.1364) projected
  line L99 (-254.304, -371.6397) -> (-256.904, -370.1386) projected
  line L100 (-254.304, -371.6397) -> (-256.904, -370.1386) projected
  circle A9 centre (-254.2813, -368.5983) radius 1.35 projected
  circle A10 centre (-254.2813, -368.5983) radius 1.35 projected
  line L101 (-256.904, -370.1386) -> (-256.904, -367.1364) projected
  line L102 (-256.904, -370.1386) -> (-256.904, -367.1364) projected
  line L103 (-256.904, -370.1386) -> (-256.904, -367.1364) projected
  line L104 (-256.904, -370.1386) -> (-256.904, -367.1364) projected
  line L105 (-255.654, -364.3375) -> (-252.954, -364.3375) projected
  circle A11 centre (-254.2813, -368.5983) radius 1.35 projected
  line L106 (-256.904, -367.1364) -> (-254.304, -365.6353) projected
  line L107 (-256.904, -370.1386) -> (-256.904, -367.1364) projected
  line L108 (-254.304, -371.6397) -> (-256.904, -370.1386) projected
  line L109 (-251.704, -370.1386) -> (-254.304, -371.6397) projected
  line L110 (-251.704, -367.1364) -> (-251.704, -370.1386) projected
  line L111 (-254.304, -365.6353) -> (-251.704, -367.1364) projected
  line L112 (-257.854, -380.9375) -> (-257.854, -356.3375) projected
  line L113 (-257.854, -380.9375) -> (-257.854, -356.3375) projected
  line L114 (-256.904, -367.1364) -> (-254.304, -365.6353) projected
  line L115 (-256.904, -367.1364) -> (-254.304, -365.6353) projected
  line L116 (-255.654, -364.3375) -> (-252.954, -364.3375) projected
  line L117 (-255.654, -356.3375) -> (-252.954, -356.3375) projected
  line L118 (-251.704, -367.1364) -> (-251.704, -370.1386) projected
  line L119 (-251.704, -367.1364) -> (-251.704, -370.1386) projected
  line L120 (-252.954, -380.9375) -> (-252.954, -372.9375) projected
  line L121 (-255.654, -380.9375) -> (-255.654, -372.9375) projected
  line L122 (-255.654, -356.3375) -> (-255.654, -364.3375) projected
  line L123 (-252.954, -356.3375) -> (-252.954, -364.3375) projected
  line L124 (-233.654, -380.9375) -> (-233.654, -372.9375) projected
  line L125 (-230.954, -380.9375) -> (-230.954, -372.9375) projected
  line L126 (-233.654, -356.3375) -> (-233.654, -364.3375) projected
  line L127 (-230.954, -356.3375) -> (-230.954, -364.3375) projected
  line L128 (-254.304, -380.9375) -> (-254.304, -374.8375)
  line L129 (-251.704, -375.9375) -> (-256.904, -375.9375)
  line L130 (-256.904, -375.9375) -> (-256.904, -373.7375)
  line L131 (-256.904, -373.7375) -> (-251.704, -373.7375)
  line L132 (-251.704, -373.7375) -> (-251.704, -375.9375)
  line L133 (-251.704, -375.9375) -> (-256.904, -373.7375) construction
  line L134 (-256.904, -375.9375) -> (-251.704, -373.7375) construction
  line L135 (-234.904, -375.9375) -> (-229.704, -375.9375)
  line L136 (-229.704, -375.9375) -> (-229.704, -373.7375)
  line L137 (-229.704, -373.7375) -> (-234.904, -373.7375)
  line L138 (-234.904, -373.7375) -> (-234.904, -375.9375)
  line L139 (-234.904, -375.9375) -> (-229.704, -373.7375) construction
  line L140 (-229.704, -375.9375) -> (-234.904, -373.7375) construction
  line L141 (-254.304, -356.3375) -> (-254.304, -362.4375)
  line L142 (-251.6578, -363.5375) -> (-256.9501, -363.5375)
  line L143 (-256.9501, -363.5375) -> (-256.9501, -361.3375)
  line L144 (-256.9501, -361.3375) -> (-251.6578, -361.3375)
  line L145 (-251.6578, -361.3375) -> (-251.6578, -363.5375)
  line L146 (-251.6578, -363.5375) -> (-256.9501, -361.3375) construction
  line L147 (-256.9501, -363.5375) -> (-251.6578, -361.3375) construction
  line L148 (-229.704, -363.5375) -> (-234.904, -363.5375)
  line L149 (-234.904, -363.5375) -> (-234.904, -361.3375)
  line L150 (-234.904, -361.3375) -> (-229.704, -361.3375)
  line L151 (-229.704, -361.3375) -> (-229.704, -363.5375)
  line L152 (-229.704, -363.5375) -> (-234.904, -361.3375) construction
  line L153 (-234.904, -363.5375) -> (-229.704, -361.3375) construction
  point P0 (0, 0)
  point P1 (-232.304, -374.8375)
  point P2 (-232.304, -362.4375)
  dimension "d82" = 6.1
  dimension "d83" = 5.2
  dimension "d84" = 2.2
  dimension "d85" = 5.2
  dimension "d86" = 2.2
  dimension "d87" = 6.1
  dimension "d88" = 2.2
  dimension "d89" = 2.2
extrude "돌출8" cut sketch "스케치10" against normal blind 6 contours L129 L121 L131 L120 | L120 L131 L132 L129 | L135 L138 L137 L124 | L124 L137 L125 L135 | L129 L130 L131 L121 | L125 L137 L136 L135 | L144 L123 L142 L122 | L122 L142 L143 L144 | L150 L151 L148 L127 | L127 L148 L126 L150 | L126 L148 L149 L150 | L144 L145 L142 L123
properties part number "3D_upper_to_head1"
